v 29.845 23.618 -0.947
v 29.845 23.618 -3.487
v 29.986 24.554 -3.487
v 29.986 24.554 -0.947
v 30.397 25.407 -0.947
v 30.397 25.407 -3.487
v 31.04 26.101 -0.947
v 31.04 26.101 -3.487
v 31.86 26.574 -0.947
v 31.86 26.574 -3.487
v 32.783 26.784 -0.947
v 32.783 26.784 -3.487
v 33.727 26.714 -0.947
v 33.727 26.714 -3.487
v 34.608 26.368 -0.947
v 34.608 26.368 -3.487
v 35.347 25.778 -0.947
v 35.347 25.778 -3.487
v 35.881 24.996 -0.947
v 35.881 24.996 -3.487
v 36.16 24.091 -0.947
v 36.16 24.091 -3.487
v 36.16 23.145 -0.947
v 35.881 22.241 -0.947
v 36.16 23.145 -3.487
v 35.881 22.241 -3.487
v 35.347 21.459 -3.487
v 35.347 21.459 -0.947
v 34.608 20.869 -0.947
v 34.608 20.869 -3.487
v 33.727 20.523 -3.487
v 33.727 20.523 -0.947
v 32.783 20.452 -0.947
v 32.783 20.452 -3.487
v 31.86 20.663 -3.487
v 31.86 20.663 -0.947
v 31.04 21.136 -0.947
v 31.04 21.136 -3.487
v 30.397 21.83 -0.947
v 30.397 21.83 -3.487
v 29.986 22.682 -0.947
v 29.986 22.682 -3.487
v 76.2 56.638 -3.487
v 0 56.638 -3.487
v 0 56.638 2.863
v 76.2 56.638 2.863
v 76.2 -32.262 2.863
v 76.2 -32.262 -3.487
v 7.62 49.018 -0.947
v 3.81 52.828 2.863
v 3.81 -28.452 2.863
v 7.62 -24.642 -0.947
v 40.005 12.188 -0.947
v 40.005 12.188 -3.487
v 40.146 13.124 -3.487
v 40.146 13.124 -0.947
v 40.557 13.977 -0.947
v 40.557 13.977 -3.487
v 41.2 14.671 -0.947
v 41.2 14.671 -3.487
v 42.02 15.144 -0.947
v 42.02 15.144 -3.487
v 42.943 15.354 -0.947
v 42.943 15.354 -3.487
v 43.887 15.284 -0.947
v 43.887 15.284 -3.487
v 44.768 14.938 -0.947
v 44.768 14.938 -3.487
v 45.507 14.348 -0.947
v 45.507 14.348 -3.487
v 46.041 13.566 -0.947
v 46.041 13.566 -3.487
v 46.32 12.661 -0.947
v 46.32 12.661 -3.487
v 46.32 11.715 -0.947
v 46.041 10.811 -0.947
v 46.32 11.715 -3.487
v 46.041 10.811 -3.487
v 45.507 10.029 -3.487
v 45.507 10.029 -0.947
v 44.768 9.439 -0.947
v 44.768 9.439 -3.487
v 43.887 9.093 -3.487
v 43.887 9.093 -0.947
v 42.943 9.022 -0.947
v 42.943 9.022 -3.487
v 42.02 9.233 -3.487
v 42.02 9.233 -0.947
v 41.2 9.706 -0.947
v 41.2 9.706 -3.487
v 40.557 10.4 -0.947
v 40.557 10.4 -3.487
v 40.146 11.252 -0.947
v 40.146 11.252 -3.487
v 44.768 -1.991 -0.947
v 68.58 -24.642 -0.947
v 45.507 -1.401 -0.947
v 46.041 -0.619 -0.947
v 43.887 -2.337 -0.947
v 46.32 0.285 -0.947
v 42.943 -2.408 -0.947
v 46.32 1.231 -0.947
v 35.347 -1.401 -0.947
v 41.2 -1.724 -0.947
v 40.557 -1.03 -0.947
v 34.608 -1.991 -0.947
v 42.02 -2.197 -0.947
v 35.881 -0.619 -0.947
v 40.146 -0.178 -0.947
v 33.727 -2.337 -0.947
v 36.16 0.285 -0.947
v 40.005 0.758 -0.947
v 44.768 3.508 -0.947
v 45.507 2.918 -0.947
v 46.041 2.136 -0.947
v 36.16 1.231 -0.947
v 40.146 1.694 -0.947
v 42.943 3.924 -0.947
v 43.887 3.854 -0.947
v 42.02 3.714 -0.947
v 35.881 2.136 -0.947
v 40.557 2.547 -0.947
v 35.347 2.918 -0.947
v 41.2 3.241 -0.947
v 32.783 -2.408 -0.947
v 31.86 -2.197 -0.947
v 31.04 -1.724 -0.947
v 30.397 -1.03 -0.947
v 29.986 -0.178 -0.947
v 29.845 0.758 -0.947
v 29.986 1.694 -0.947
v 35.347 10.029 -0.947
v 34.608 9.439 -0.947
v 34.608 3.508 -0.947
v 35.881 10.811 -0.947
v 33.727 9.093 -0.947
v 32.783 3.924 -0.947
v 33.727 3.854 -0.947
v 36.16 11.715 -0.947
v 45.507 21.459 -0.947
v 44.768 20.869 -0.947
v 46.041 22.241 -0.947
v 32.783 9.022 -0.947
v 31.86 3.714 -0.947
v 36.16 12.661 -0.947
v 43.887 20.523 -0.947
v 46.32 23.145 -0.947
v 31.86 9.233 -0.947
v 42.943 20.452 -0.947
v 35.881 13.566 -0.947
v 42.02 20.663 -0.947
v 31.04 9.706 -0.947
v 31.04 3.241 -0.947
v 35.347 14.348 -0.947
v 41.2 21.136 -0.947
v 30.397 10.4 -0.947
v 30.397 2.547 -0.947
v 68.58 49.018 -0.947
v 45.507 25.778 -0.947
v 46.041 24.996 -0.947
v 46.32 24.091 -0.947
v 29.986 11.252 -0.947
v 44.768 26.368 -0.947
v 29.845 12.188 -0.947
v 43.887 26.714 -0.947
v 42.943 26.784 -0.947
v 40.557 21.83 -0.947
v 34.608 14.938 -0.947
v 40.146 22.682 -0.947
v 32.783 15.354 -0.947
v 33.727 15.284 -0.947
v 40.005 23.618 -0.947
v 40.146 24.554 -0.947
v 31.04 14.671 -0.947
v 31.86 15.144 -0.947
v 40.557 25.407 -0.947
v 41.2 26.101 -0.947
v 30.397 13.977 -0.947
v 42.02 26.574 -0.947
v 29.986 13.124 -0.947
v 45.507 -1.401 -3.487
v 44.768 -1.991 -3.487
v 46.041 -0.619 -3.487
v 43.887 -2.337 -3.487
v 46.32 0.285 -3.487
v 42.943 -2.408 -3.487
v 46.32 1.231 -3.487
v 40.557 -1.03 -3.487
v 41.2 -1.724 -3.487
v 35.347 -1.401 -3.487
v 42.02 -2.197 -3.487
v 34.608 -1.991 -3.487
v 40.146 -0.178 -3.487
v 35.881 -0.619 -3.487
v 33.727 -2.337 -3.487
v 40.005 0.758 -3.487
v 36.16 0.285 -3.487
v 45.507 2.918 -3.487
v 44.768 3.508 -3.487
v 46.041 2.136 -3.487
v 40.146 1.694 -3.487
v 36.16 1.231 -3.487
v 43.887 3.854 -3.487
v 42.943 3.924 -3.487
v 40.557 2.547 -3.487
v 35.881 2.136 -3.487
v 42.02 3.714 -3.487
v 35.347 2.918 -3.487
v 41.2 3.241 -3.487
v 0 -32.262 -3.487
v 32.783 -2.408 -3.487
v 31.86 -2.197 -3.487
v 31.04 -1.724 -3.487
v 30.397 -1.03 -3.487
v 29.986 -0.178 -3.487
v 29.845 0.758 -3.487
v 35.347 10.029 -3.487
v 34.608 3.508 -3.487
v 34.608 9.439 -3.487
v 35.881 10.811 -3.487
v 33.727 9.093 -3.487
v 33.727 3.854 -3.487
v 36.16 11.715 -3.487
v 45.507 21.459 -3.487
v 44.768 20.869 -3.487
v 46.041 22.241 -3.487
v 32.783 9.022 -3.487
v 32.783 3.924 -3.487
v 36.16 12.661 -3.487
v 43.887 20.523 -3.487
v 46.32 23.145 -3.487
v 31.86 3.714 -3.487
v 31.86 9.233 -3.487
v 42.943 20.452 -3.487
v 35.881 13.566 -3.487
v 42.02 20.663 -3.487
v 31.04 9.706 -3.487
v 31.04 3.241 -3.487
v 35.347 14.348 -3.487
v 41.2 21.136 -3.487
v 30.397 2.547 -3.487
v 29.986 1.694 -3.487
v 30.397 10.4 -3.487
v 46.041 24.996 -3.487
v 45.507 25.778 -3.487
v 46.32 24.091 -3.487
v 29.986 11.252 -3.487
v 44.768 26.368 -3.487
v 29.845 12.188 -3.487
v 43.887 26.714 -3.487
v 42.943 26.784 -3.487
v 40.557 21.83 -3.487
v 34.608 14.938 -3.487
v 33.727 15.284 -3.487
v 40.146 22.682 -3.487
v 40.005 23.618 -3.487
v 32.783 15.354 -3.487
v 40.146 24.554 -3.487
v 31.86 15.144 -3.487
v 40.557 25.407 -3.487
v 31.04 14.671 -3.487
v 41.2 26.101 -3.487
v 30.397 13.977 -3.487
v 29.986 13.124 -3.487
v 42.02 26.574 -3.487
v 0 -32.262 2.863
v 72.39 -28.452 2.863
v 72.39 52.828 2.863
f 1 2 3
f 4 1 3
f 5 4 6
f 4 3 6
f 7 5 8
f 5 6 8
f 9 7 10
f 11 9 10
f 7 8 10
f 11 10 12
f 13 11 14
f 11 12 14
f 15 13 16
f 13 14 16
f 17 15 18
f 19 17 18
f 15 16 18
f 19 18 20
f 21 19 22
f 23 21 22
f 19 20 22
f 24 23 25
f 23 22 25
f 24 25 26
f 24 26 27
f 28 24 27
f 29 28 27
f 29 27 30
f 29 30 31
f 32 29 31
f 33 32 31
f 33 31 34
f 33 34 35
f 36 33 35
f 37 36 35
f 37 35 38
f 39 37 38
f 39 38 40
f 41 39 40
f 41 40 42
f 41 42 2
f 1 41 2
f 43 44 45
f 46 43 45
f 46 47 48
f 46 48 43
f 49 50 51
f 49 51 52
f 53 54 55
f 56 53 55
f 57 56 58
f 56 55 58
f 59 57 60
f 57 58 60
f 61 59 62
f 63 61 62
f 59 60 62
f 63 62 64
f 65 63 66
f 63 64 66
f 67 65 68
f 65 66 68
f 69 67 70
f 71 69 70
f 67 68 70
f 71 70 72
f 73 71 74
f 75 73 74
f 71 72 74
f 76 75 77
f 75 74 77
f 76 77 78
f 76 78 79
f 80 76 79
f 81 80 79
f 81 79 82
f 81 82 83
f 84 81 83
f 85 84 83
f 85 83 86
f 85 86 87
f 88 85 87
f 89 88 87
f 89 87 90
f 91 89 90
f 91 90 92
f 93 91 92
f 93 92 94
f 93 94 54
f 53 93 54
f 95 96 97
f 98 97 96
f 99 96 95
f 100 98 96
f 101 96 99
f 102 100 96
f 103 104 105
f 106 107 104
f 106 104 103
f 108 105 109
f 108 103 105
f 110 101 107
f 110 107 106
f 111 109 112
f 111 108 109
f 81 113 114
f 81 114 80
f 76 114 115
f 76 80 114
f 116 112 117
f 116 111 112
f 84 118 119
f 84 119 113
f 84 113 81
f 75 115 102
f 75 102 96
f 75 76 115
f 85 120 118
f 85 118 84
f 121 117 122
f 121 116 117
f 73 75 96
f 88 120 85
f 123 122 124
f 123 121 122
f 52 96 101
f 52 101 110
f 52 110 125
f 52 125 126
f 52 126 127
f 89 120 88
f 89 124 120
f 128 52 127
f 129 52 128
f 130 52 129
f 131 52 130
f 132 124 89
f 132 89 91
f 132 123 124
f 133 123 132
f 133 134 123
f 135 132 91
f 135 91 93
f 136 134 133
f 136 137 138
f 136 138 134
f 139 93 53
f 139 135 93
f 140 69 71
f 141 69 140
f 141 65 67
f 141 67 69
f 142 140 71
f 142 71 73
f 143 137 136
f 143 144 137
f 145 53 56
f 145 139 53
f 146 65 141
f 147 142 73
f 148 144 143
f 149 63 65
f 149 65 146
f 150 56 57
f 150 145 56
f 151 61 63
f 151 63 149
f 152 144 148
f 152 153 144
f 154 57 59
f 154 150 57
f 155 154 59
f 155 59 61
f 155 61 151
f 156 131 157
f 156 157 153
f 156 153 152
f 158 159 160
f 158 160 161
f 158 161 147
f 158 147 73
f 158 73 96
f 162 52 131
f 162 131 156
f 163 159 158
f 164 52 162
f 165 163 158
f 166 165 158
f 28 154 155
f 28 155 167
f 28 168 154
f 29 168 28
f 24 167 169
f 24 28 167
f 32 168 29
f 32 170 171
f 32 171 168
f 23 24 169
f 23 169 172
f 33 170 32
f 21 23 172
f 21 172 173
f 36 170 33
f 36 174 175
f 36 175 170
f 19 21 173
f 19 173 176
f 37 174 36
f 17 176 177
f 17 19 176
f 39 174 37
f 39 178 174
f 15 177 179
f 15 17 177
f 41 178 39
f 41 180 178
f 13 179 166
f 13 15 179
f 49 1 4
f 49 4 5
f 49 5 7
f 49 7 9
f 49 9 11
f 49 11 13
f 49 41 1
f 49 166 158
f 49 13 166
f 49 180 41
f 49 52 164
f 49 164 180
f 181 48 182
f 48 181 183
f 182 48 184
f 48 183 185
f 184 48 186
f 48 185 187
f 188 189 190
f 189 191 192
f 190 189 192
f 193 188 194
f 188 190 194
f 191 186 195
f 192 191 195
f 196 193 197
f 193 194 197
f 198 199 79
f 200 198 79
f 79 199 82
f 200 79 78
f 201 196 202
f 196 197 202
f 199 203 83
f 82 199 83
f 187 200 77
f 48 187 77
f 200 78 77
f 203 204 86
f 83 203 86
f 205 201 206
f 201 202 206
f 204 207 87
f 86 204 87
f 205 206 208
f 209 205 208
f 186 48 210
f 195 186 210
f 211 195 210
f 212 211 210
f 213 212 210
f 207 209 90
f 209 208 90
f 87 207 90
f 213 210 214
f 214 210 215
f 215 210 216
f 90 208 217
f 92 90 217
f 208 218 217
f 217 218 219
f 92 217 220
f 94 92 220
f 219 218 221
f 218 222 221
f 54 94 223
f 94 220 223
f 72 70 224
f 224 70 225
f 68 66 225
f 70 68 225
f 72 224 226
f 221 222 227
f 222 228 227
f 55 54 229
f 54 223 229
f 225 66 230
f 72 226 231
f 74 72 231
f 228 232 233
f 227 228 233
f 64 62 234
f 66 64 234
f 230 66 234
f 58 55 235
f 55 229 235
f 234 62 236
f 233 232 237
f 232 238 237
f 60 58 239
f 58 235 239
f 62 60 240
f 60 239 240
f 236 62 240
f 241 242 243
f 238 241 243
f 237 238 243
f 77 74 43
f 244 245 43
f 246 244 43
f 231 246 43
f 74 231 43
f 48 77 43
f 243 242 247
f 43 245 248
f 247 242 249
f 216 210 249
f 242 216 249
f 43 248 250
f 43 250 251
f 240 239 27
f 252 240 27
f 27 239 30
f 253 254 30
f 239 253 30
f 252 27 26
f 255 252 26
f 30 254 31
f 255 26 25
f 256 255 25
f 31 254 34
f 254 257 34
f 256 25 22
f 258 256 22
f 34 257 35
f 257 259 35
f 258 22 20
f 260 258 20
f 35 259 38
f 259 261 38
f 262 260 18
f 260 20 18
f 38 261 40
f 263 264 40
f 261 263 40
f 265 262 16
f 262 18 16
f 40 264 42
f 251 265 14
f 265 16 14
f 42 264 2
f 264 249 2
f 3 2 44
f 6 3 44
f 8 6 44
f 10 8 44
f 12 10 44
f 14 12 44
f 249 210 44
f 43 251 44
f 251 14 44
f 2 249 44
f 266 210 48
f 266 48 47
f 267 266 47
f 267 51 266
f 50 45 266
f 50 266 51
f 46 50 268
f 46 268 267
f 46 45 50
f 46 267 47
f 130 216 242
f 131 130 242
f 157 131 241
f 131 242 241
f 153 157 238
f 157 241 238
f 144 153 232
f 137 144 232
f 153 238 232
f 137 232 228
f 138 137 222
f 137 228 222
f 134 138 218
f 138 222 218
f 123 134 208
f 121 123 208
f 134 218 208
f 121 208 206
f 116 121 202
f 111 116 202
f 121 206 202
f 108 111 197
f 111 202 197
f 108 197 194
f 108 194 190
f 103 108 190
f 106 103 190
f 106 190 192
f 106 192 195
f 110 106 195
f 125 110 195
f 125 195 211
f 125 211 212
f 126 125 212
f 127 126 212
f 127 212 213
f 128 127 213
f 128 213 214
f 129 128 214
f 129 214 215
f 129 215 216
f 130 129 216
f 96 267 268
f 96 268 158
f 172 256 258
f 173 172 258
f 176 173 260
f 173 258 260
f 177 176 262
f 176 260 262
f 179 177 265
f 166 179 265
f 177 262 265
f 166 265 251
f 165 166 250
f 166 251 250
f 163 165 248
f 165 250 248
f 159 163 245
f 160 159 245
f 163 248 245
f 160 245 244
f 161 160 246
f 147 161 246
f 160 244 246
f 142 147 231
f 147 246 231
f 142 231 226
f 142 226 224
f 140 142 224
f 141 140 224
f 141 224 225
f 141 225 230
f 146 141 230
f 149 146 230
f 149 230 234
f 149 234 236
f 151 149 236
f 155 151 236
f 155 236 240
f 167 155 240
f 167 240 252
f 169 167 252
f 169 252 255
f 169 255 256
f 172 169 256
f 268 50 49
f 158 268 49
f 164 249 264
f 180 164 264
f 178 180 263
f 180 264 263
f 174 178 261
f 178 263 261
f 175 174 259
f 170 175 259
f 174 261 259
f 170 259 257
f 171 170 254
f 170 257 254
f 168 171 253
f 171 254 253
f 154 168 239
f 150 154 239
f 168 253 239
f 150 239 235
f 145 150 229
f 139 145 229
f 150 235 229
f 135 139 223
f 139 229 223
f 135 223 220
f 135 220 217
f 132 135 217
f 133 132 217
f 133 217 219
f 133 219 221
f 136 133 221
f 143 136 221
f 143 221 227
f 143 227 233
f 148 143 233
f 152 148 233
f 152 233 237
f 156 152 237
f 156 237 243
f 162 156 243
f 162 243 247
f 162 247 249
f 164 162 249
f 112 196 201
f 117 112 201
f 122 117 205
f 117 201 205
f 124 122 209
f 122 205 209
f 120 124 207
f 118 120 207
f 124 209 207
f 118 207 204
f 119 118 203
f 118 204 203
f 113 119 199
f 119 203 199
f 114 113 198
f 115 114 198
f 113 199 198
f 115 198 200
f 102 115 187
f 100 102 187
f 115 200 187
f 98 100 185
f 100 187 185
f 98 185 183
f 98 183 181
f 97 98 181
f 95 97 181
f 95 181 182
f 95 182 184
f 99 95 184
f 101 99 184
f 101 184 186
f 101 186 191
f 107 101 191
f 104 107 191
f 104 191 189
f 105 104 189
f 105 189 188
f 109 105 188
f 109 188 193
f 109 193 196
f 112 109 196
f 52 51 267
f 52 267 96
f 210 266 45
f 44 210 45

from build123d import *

# Parameters (mm, degrees)
F0_W         = 88.9
F0_H         = 6.35
F1_DEPTH     = 76.2
F2_T         = -2.54
F3_T4_DEPTH  = 83.82
F3_T9_DEPTH  = 71.12
F3_T14_DEPTH = 83.82
F3_T19_DEPTH = 71.12
F5_D         = 6.35
F5_DEPTH     = 12.7
F5_TIP       = 1.9077324654


# Not quite as in the source:
# - a fillet or chamfer that OpenCascade refuses, or shapes differently, is made with other operations: its cross-section is extruded or revolved along the edge and cut away or added


with BuildPart() as f1:
    # F0 (on Right) → F1 (new body)
    with BuildSketch(Plane.YZ):
        with Locations((12.1882097632, -0.3118954591)):
            Rectangle(F0_W, F0_H)
    extrude(amount=F1_DEPTH)

    # F2
    f2_openings = [f1.faces().sort_by_distance(p)[0] for p in [
        (38.1, 12.18821, 2.863105),
    ]]
    offset(amount=F2_T, openings=f2_openings)

    # F3: chamfer of 5.08 on 4 edges, made by hand


with BuildPart() as f3_tool2:
    # F3_s3 → F3_t4 (new body)
    with BuildSketch(Plane.XZ.offset(-54.0982097632)):
        Polygon((2.54, 4.1331045409), (7.62, -0.9468954591), (2.54, -0.9468954591), align=None)
    extrude(amount=F3_T4_DEPTH)

    split(bisect_by=Plane.XY.offset(2.8631045409), keep=Keep.BOTTOM)


with BuildPart() as f1_1:
    add(f1.part)

    # F3_t1: union F3_tool2
    add(f3_tool2.part)


with BuildPart() as f3_tool7:
    # F3_s8 → F3_t9 (new body)
    with BuildSketch(Plane.YZ.offset(2.54)):
        Polygon((-29.7217902368, 4.1331045409), (-24.6417902368, -0.9468954591), (-29.7217902368, -0.9468954591), align=None)
    extrude(amount=F3_T9_DEPTH)

    split(bisect_by=Plane.XY.offset(2.8631045409), keep=Keep.BOTTOM)


with BuildPart() as f1_2:
    add(f1_1.part)

    # F3_t6: union F3_tool7
    add(f3_tool7.part)


with BuildPart() as f3_tool12:
    # F3_s13 → F3_t14 (new body)
    with BuildSketch(Plane.XZ.offset(-54.0982097632)):
        Polygon((73.66, 4.1331045409), (68.58, -0.9468954591), (73.66, -0.9468954591), align=None)
    extrude(amount=F3_T14_DEPTH)

    split(bisect_by=Plane.XY.offset(2.8631045409), keep=Keep.BOTTOM)


with BuildPart() as f1_3:
    add(f1_2.part)

    # F3_t11: union F3_tool12
    add(f3_tool12.part)


with BuildPart() as f3_tool17:
    # F3_s18 → F3_t19 (new body)
    with BuildSketch(Plane.YZ.offset(73.66)):
        Polygon((54.0982097632, 4.1331045409), (49.0182097632, -0.9468954591), (54.0982097632, -0.9468954591), align=None)
    extrude(amount=-F3_T19_DEPTH)

    split(bisect_by=Plane.XY.offset(2.8631045409), keep=Keep.BOTTOM)


with BuildPart() as f1_4:
    add(f1_3.part)

    # F3_t16: union F3_tool17
    add(f3_tool17.part)

    # F5
    with Locations(Plane.XY.offset(-0.9468954591)):
        with Locations((33.02, 23.6182097632), (43.18, 23.6182097632), (43.18, 12.1882097632), (33.02, 12.1882097632), (33.02, 0.7582097632), (43.18, 0.7582097632)):
            Hole(F5_D / 2, depth=F5_DEPTH)
            with Locations((0, 0, -(F5_DEPTH + F5_TIP / 2))):  # 118° drill point
                Cone(0, F5_D / 2, F5_TIP, mode=Mode.SUBTRACT)


solid = f1_4.part
